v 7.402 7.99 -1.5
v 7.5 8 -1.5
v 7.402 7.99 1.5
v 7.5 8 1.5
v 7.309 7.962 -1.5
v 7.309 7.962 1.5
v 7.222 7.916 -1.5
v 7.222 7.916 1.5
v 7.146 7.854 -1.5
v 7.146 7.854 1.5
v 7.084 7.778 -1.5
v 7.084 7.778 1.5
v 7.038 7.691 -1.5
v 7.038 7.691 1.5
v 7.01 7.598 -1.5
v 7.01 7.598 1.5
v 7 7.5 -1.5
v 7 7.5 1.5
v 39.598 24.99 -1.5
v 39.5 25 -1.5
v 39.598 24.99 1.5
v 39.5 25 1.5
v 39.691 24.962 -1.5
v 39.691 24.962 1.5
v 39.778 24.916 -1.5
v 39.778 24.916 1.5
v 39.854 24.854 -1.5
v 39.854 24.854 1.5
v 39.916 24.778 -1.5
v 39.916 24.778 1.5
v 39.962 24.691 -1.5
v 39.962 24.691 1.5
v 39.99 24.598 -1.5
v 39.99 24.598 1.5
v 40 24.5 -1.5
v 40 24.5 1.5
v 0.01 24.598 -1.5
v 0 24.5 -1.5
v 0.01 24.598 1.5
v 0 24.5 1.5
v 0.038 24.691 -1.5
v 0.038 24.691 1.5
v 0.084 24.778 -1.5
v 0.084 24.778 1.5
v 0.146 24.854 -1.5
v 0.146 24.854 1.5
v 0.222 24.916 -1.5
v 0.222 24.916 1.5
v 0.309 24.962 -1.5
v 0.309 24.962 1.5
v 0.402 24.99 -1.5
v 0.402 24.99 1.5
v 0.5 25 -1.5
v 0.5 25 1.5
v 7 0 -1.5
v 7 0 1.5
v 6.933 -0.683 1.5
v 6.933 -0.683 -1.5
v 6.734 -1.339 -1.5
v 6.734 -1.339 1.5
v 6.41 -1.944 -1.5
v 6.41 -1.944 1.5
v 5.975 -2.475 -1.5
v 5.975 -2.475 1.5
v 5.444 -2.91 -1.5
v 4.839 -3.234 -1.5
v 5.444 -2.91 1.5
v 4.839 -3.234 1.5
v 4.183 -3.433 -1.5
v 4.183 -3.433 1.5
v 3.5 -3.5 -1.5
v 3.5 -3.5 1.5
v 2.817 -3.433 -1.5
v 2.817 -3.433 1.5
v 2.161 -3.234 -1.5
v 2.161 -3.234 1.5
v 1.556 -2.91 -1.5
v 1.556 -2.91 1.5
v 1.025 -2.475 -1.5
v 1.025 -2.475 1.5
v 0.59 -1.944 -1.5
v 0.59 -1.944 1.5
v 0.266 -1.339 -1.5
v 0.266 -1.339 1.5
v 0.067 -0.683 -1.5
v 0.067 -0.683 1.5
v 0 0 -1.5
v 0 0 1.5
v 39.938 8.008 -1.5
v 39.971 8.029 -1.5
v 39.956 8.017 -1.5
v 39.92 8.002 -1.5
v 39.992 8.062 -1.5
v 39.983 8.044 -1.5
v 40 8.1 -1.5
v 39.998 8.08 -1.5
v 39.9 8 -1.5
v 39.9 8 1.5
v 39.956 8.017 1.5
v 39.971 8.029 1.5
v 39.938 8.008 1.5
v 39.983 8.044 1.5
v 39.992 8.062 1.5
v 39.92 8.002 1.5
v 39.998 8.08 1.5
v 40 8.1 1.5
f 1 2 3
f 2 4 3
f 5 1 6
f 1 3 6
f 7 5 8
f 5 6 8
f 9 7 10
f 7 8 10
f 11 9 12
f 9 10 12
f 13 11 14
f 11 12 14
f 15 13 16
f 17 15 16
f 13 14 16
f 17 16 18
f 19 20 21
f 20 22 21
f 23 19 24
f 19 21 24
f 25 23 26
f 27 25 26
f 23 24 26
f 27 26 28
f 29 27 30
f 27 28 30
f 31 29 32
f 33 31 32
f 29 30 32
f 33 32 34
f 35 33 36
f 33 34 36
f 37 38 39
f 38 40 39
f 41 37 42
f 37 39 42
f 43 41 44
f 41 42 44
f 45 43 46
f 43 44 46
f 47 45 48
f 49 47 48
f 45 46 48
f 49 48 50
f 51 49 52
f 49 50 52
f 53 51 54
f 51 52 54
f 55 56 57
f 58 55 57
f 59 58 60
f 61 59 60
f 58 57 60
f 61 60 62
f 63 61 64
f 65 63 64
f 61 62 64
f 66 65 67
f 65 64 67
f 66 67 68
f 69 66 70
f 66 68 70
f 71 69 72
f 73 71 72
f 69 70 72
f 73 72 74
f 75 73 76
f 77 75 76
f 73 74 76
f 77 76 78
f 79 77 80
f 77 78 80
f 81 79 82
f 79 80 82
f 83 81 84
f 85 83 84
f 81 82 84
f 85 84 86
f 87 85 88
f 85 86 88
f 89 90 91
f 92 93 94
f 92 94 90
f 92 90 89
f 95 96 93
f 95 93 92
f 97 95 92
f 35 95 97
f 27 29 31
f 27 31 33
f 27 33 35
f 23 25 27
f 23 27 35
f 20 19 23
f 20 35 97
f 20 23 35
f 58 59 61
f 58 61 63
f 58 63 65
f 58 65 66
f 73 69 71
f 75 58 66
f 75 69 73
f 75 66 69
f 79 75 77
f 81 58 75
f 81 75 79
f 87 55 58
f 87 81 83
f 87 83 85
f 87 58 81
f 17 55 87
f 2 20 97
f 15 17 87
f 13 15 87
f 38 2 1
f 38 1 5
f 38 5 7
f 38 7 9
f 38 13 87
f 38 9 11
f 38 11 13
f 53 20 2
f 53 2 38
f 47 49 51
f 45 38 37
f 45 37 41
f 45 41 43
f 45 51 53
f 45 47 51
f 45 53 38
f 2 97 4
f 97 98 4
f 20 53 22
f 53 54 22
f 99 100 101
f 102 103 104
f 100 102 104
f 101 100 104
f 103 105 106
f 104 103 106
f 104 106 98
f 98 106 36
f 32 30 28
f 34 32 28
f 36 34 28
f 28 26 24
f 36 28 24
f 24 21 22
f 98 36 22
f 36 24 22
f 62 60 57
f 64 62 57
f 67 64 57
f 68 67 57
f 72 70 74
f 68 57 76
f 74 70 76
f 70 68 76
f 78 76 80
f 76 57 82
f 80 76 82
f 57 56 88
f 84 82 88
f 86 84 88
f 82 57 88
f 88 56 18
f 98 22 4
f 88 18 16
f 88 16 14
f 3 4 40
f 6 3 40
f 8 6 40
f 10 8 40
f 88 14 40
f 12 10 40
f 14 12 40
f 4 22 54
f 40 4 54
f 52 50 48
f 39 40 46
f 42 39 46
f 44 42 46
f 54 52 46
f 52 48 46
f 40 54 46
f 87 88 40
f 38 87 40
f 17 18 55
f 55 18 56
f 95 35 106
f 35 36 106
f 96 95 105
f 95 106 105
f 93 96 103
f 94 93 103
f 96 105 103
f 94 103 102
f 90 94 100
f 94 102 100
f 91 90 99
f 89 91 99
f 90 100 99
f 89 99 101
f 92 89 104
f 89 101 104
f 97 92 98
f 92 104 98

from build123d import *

# Parameters (mm, degrees)
BODY_DEPTH = 1.5


with BuildPart() as part:
    # Sketch1 → Body (new body, symmetric)
    with BuildSketch(Plane.XY):
        with BuildLine():
            Line((0, 0), (0, 24.5))
            ThreePointArc((0, 24.5), (0.146446609, 24.853553391), (0.5, 25))
            Line((0.5, 25), (28.339745962, 25))
            Line((28.339745962, 25), (39.5, 25))
            ThreePointArc((39.5, 25), (39.853553391, 24.853553391), (40, 24.5))
            Line((40, 24.5), (40, 8.1))
            ThreePointArc((40, 8.1), (39.970710678, 8.029289322), (39.9, 8))
            Line((39.9, 8), (36.966924922, 8))
            Line((36.966924922, 8), (7.5, 8))
            ThreePointArc((7.5, 8), (7.146446609, 7.853553391), (7, 7.5))
            Line((7, 7.5), (7, 0))
            ThreePointArc((7, 0), (3.5, -3.5), (0, 0))
        make_face()
    extrude(amount=BODY_DEPTH, both=True)


solid = part.part
